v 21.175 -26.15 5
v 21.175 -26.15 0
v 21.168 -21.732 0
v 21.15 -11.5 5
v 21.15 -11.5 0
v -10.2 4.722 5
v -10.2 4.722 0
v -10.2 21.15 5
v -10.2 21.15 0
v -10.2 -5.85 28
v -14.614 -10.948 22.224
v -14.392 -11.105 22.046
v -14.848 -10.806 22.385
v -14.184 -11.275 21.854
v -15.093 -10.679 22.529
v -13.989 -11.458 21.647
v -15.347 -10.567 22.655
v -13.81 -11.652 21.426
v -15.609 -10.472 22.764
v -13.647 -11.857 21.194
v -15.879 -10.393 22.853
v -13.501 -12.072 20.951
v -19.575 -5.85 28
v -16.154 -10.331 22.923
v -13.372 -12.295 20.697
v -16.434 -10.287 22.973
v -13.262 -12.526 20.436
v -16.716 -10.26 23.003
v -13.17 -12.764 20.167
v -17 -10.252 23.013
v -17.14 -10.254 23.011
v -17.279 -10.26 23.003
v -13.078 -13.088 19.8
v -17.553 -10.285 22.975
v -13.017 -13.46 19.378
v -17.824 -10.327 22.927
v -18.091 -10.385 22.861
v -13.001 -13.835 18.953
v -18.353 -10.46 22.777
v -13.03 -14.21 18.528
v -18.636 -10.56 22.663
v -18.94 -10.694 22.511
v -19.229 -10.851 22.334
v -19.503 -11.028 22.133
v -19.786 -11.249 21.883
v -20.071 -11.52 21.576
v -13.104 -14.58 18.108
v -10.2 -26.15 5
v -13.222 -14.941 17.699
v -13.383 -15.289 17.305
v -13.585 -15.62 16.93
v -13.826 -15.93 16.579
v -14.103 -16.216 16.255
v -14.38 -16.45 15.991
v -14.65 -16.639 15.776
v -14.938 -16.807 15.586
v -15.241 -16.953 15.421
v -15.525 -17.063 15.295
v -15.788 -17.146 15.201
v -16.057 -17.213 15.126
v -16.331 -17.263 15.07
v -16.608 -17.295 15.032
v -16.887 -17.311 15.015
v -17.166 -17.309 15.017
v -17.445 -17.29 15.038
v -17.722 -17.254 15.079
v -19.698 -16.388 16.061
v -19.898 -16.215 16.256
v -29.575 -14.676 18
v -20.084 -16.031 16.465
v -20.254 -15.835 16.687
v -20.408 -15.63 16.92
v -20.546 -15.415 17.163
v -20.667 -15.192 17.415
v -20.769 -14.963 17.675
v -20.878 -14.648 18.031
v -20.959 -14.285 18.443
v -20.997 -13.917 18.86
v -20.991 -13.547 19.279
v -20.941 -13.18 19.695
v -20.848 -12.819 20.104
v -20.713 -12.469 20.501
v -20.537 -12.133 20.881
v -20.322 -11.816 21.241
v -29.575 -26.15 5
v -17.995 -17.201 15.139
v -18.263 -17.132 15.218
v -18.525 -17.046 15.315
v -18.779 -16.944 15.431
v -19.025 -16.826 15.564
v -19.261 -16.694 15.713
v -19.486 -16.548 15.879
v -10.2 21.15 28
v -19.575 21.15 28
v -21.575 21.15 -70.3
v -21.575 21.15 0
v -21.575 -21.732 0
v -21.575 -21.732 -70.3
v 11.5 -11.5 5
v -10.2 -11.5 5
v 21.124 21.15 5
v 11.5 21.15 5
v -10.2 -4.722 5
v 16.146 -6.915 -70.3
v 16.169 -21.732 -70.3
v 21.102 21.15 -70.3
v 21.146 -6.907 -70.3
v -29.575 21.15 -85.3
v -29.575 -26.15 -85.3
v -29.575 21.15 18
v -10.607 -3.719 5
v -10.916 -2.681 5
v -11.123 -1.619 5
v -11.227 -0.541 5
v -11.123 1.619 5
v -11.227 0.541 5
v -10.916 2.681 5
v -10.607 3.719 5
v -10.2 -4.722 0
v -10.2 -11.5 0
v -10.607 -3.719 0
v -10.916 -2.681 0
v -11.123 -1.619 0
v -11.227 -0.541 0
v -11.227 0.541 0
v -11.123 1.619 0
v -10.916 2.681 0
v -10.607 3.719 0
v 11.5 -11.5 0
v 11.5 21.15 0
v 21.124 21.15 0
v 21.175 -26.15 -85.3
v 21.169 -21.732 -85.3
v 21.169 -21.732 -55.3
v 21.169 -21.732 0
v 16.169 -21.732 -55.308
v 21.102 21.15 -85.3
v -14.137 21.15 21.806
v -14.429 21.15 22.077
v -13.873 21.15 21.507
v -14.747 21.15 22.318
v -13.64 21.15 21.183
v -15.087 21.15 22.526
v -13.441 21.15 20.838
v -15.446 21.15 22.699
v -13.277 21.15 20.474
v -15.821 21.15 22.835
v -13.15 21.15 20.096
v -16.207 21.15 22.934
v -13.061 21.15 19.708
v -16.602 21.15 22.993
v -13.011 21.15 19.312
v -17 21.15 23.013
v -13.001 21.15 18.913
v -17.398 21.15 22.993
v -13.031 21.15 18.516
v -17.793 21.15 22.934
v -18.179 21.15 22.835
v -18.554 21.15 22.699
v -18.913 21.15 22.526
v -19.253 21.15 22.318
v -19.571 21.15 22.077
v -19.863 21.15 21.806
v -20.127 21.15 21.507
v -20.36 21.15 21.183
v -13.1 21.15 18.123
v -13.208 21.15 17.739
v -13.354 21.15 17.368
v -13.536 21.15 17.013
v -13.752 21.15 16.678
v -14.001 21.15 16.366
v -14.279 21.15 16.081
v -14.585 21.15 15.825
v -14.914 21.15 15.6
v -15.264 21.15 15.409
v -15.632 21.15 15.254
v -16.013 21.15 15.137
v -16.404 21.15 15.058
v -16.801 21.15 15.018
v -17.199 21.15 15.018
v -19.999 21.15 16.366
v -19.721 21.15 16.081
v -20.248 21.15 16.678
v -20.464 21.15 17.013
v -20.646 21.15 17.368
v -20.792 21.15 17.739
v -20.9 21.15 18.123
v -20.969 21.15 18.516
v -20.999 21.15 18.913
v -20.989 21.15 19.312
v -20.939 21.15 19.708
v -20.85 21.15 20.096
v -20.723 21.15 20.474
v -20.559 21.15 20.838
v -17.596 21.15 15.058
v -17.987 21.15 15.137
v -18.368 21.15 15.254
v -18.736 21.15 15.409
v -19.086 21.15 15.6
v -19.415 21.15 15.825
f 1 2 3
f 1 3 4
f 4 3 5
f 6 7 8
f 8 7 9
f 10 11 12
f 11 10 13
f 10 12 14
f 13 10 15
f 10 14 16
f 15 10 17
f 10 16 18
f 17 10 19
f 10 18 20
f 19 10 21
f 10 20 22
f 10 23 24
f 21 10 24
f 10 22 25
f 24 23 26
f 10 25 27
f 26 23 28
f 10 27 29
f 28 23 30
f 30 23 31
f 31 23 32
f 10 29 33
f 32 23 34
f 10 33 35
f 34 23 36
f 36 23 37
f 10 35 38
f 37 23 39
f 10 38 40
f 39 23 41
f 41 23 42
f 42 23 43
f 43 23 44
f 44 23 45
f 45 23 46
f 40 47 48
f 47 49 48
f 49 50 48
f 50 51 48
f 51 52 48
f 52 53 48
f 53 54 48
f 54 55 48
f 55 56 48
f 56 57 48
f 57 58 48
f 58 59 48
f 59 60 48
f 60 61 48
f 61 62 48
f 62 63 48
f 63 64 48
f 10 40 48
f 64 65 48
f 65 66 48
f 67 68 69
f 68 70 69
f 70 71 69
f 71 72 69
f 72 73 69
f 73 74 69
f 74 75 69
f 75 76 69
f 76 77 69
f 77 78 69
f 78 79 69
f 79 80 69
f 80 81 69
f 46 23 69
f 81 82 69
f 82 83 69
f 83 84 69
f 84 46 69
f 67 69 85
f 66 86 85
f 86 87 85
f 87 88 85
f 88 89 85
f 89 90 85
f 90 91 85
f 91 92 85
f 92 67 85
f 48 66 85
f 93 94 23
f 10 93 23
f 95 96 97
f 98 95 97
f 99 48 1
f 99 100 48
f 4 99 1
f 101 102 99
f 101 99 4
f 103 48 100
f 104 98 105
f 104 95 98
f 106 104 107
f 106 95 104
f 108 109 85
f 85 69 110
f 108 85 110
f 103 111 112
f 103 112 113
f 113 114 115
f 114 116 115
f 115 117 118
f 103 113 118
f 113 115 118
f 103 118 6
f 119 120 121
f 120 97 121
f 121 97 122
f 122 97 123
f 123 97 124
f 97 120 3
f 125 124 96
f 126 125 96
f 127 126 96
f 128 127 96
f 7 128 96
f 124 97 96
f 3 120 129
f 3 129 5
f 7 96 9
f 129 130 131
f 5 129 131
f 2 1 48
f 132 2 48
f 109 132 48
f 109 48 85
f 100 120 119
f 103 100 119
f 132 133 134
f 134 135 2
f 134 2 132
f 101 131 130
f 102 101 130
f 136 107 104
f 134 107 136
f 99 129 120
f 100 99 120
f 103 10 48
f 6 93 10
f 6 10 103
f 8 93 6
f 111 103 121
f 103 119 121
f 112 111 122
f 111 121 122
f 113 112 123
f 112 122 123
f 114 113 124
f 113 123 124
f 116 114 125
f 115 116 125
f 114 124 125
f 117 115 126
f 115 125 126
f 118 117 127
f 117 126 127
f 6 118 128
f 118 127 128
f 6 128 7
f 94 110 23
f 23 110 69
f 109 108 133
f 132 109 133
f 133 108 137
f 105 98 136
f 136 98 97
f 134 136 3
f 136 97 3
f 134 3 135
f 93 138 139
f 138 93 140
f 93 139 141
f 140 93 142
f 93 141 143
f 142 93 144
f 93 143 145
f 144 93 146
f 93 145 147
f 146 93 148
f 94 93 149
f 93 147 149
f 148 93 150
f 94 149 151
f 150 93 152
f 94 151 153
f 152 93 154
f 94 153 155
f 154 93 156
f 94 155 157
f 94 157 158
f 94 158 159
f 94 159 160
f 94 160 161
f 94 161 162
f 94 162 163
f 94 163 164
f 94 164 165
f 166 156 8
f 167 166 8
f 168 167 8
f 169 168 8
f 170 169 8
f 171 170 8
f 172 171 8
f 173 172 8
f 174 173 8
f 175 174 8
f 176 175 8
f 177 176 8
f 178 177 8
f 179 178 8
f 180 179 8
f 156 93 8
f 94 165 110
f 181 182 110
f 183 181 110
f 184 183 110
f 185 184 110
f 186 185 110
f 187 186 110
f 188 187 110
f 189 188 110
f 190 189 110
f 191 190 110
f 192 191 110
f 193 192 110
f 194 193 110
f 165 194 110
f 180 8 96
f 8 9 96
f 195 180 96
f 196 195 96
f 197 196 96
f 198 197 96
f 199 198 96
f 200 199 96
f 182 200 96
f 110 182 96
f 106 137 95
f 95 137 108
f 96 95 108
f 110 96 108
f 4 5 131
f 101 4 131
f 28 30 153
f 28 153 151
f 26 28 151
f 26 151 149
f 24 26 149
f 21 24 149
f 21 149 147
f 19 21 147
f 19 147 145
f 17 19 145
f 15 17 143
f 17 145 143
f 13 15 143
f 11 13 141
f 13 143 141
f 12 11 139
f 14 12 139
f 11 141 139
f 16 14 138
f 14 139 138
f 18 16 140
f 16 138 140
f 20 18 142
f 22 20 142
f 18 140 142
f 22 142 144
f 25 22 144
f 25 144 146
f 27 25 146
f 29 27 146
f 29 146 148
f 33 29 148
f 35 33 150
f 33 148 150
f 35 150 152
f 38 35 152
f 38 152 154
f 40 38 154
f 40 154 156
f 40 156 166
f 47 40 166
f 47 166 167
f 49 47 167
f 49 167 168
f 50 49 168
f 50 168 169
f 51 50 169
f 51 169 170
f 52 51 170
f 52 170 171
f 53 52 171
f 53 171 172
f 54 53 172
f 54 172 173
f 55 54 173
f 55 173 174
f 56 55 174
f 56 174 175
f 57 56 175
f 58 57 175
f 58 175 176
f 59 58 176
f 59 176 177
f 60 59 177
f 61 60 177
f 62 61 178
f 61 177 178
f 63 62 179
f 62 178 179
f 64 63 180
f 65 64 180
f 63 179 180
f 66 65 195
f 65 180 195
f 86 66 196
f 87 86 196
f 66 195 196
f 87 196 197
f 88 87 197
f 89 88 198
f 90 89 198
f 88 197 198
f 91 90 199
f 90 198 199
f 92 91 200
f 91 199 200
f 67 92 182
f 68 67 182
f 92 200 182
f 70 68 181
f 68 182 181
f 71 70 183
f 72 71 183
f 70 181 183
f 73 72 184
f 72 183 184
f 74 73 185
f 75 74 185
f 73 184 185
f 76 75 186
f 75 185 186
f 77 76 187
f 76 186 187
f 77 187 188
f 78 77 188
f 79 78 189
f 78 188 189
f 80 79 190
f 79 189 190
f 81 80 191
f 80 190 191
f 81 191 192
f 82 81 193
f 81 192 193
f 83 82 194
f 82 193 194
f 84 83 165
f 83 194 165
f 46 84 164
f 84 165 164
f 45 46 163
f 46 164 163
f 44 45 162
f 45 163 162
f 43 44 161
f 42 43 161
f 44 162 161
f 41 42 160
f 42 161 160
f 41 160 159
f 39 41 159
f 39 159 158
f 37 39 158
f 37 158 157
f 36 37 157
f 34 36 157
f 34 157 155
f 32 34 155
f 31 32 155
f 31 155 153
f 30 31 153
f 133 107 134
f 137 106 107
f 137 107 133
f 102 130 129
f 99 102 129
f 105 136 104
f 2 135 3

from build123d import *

# Parameters (mm, degrees)
SALIENTE_EXTRUIR1_DEPTH = 5
SALIENTE_EXTRUIR3_DEPTH = 19.374886
CROQUIS3_R              = 3.999935673
CORTAR_EXTRUIR2_DEPTH   = 45
SALIENTE_EXTRUIR4_DEPTH = 85.3
SALIENTE_EXTRUIR5_DEPTH = 15
SALIENTE_EXTRUIR6_DEPTH = 5
CHAFL_N1_SIZE           = 10


with BuildPart() as part:
    # Croquis1 → Saliente-Extruir1 (new body)
    with BuildSketch(Plane.XY):
        with BuildLine():
            Line((-10.200205365, -11.5), (-10.200205365, -4.721731506))
            ThreePointArc((-10.200205365, -4.721731506), (-11.240059515, 0), (-10.200205365, 4.721731506))
            Line((-10.200205365, 4.721731506), (-10.200205365, 21.15))
            Line((-10.200205365, 21.15), (-29.575095614, 21.15))
            Line((-29.575095614, 21.15), (-29.575095614, -26.15))
            Line((-29.575095614, -26.15), (-21.15, -26.15))
            Line((-21.15, -26.15), (21.175474863, -26.15))
            Line((21.175474863, -26.15), (21.15, -11.5))
            Line((21.15, -11.5), (21.124259996, 21.15))
            Line((21.124259996, 21.15), (11.5, 21.15))
            Line((11.5, 21.15), (11.5, -11.5))
            Line((11.5, -11.5), (-10.200205365, -11.5))
        make_face()
    extrude(amount=SALIENTE_EXTRUIR1_DEPTH)

    # Croquis2 → Saliente-Extruir3 (add)
    with BuildSketch(Plane.ZY.offset(29.575095614)):
        Polygon((5, 21.15), (28, 21.15), (28, -5.85), (5, -26.15), align=None)
    extrude(amount=-SALIENTE_EXTRUIR3_DEPTH)

    # Croquis3 → Cortar-Extruir2 (cut)
    with BuildSketch(Plane(origin=(0, 21.15, 0), x_dir=(1, 0, 0), z_dir=(0, 1, 0))):
        with Locations(Location((-17, -19.013114366, 0), (0, 0, 270))):
            Circle(CROQUIS3_R)
    extrude(amount=-CORTAR_EXTRUIR2_DEPTH, mode=Mode.SUBTRACT)

    # Croquis4 → Saliente-Extruir4 (add)
    with BuildSketch(Plane(origin=(0, 0, 0), x_dir=(-1, 0, 0), z_dir=(0, 0, -1))):
        Polygon((-21.175474863, -26.15), (29.575095614, -26.15), (29.575095614, 21.15), (21.575095614, 21.15), (21.575095614, -21.731968458), (-21.168633339, -21.731968458), align=None)
    extrude(amount=SALIENTE_EXTRUIR4_DEPTH)

    # Croquis5 → Saliente-Extruir5 (add)
    with BuildSketch(Plane(origin=(0, 0, -85.3), x_dir=(-1, 0, 0), z_dir=(0, 0, -1))):
        Polygon((-21.168633339, -21.731968458), (-21.102228651, 21.15), (29.575095614, 21.15), (29.575095614, -26.15), (-21.175474863, -26.15), align=None)
    extrude(amount=-SALIENTE_EXTRUIR5_DEPTH)

    # Croquis7 → Saliente-Extruir6 (add)
    with BuildSketch(Plane(origin=(21.134929711, 0.032728405, 0), x_dir=(0, 0, -1), z_dir=(0.9999988010052605, 0.0015485438455565383, 0))):
        Polygon((70.3, -21.764722958), (70.3, -6.93985202), (55.3, -21.764722958), align=None)
    extrude(amount=-SALIENTE_EXTRUIR6_DEPTH)

    # Chaflán1
    chafl_n1_edges = [part.edges().sort_by_distance(p)[0] for p in [
        (-29.575095614, 7.65, 28),
    ]]
    chamfer(chafl_n1_edges, length=CHAFL_N1_SIZE)


solid = part.part
